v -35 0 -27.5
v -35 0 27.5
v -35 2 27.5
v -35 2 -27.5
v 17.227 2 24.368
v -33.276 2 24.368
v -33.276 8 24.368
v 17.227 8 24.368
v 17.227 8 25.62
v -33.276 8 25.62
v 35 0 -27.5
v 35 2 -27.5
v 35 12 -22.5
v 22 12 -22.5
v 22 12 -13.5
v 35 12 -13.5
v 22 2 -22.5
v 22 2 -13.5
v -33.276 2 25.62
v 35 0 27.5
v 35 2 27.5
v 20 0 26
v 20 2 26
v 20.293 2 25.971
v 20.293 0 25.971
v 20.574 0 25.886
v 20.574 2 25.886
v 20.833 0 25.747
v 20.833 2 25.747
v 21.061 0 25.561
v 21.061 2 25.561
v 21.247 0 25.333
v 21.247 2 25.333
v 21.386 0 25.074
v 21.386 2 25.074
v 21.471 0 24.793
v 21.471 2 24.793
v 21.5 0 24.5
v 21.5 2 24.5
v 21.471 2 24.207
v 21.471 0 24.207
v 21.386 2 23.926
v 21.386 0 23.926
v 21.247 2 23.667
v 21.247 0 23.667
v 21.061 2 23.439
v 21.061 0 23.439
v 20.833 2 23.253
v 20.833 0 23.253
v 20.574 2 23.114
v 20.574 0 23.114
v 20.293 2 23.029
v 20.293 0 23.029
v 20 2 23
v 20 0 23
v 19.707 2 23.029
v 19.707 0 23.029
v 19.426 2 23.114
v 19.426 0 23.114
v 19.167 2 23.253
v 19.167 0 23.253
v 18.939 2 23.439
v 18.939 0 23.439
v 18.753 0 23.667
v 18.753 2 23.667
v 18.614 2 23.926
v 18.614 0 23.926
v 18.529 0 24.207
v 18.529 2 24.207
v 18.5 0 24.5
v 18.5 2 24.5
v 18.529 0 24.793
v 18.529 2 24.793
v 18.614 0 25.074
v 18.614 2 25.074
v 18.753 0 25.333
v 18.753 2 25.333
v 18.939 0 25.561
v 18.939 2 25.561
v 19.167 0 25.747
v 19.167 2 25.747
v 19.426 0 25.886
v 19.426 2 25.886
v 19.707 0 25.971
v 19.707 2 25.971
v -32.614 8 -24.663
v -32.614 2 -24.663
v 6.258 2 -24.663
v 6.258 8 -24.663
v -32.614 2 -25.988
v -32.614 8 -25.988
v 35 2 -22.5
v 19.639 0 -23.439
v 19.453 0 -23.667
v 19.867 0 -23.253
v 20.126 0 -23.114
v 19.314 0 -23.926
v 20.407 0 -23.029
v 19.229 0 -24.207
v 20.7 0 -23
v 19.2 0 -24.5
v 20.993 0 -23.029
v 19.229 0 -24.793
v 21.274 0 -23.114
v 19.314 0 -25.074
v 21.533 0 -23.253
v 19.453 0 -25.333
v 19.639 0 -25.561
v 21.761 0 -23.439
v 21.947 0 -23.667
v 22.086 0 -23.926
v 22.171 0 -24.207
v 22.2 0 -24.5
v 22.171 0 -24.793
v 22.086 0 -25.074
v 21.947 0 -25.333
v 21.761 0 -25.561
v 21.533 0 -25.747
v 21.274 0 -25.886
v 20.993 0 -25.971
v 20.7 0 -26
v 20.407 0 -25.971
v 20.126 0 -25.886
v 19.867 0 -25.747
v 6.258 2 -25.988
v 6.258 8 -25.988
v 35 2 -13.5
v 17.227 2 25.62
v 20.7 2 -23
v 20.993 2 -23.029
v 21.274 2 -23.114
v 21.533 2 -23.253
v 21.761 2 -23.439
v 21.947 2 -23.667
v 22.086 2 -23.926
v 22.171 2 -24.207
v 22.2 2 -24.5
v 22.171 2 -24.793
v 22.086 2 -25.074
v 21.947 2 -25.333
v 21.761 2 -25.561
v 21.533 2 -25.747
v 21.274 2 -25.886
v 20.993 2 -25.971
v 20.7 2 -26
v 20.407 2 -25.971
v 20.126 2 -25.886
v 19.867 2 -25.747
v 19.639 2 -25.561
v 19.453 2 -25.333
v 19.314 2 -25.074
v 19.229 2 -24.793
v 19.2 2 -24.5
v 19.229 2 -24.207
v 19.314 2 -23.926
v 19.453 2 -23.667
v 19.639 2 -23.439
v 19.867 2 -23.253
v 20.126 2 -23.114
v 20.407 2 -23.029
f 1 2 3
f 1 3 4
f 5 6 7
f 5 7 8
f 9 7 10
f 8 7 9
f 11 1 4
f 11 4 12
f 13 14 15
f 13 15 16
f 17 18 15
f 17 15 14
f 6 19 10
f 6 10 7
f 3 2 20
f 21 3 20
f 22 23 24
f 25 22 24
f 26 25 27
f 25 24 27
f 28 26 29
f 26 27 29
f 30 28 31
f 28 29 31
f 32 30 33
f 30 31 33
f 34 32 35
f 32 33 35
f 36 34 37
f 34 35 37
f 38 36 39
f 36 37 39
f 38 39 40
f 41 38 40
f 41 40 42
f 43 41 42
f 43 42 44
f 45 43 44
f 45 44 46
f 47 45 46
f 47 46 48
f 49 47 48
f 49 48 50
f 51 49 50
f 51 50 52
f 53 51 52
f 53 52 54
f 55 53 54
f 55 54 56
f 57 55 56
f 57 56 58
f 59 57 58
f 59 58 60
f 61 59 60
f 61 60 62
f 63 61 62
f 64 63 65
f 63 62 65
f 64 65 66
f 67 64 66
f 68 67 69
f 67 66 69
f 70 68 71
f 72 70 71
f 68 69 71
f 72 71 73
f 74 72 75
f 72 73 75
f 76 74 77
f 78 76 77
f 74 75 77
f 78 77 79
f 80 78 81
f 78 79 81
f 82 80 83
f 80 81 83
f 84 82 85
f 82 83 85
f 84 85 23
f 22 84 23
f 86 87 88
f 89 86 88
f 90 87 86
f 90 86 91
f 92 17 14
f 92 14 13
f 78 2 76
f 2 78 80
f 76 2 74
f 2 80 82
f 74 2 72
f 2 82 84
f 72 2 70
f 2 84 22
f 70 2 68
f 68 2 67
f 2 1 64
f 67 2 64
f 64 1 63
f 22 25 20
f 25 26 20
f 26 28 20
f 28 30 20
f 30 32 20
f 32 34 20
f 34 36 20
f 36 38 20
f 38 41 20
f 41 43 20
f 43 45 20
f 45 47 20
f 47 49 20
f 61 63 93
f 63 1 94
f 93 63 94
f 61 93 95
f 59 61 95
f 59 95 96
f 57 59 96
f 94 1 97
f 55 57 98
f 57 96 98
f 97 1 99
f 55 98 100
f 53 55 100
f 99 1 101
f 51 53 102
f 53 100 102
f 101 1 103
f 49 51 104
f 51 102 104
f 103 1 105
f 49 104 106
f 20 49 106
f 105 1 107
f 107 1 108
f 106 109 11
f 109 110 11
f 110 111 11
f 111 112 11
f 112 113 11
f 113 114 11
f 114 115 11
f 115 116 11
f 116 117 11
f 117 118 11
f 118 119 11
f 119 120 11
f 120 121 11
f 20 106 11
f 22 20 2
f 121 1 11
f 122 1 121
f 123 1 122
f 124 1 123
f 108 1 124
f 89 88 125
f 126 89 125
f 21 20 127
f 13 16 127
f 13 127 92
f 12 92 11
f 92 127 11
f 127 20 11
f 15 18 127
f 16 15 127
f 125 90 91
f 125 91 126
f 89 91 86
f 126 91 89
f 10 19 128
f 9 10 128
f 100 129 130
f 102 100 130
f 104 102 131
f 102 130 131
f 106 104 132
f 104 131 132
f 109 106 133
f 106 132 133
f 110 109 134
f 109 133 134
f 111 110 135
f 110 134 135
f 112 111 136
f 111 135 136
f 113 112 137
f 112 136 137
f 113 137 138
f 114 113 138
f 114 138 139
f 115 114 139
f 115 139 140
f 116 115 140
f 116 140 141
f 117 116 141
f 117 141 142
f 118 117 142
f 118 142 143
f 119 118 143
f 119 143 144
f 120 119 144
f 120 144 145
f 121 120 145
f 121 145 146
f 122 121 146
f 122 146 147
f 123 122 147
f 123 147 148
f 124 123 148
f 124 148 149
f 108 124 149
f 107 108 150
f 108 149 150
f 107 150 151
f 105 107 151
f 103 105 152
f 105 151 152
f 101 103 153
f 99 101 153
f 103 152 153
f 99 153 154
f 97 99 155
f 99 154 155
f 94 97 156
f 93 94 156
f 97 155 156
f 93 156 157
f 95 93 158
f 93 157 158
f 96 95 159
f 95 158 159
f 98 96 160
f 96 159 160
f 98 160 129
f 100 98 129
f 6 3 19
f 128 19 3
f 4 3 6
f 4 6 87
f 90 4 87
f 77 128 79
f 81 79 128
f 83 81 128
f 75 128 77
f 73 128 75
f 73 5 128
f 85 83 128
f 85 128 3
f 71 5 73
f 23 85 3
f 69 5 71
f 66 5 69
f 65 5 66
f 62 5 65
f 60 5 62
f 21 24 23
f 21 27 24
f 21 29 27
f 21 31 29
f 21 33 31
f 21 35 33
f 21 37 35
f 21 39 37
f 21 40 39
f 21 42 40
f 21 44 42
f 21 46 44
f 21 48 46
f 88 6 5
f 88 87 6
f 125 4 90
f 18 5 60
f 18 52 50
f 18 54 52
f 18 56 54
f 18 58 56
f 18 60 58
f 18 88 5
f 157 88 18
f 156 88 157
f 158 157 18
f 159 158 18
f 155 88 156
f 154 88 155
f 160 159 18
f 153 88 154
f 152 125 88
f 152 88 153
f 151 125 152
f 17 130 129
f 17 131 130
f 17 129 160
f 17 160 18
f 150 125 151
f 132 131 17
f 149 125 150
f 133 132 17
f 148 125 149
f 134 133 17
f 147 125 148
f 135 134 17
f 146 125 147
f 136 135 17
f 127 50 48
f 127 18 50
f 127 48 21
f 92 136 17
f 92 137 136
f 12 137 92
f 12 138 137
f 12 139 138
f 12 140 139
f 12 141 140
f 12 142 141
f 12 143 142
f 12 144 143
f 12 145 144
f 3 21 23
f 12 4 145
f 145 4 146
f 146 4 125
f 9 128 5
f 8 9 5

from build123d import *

# Parameters (mm, degrees)
ESQUISSE2_W             = 70
ESQUISSE2_H             = 55
BOSS_EXTRU_1_DEPTH      = 2
ESQUISSE3_W             = 13
ESQUISSE3_H             = 9
BOSS_EXTRU_2_DEPTH      = 10
ESQUISSE4_W             = 38.871257781
ESQUISSE4_H             = 1.325156515
ESQUISSE4_W_2           = 50.503187194
ESQUISSE4_H_2           = 1.251536709
BOSS_EXTRU_3_DEPTH      = 6
ESQUISSE5_R             = 1.5
ENL_V_MAT_EXTRU_1_DEPTH = 6
ESQUISSE6_R             = 1.5
ENL_V_MAT_EXTRU_2_DEPTH = 6


with BuildPart() as part:
    # Esquisse2 → Boss.-Extru.1 (new body)
    with BuildSketch(Plane(origin=(0, 0, 0), x_dir=(1, 0, 0), z_dir=(0, 1, 0))):
        Rectangle(ESQUISSE2_W, ESQUISSE2_H)
    extrude(amount=BOSS_EXTRU_1_DEPTH)

    # Esquisse3 → Boss.-Extru.2 (add)
    with BuildSketch(Plane(origin=(0, 2, 0), x_dir=(1, 0, 0), z_dir=(0, 1, 0))):
        with Locations((28.5, 18)):
            Rectangle(ESQUISSE3_W, ESQUISSE3_H)
    extrude(amount=BOSS_EXTRU_2_DEPTH)

    # Esquisse4 → Boss.-Extru.3 (add)
    with BuildSketch(Plane(origin=(0, 2, 0), x_dir=(1, 0, 0), z_dir=(0, 1, 0))):
        with Locations((-13.177945346, 25.325213404)):
            Rectangle(ESQUISSE4_W, ESQUISSE4_H)
        with Locations((-8.024558898, -24.993924275)):
            Rectangle(ESQUISSE4_W_2, ESQUISSE4_H_2)
    extrude(amount=BOSS_EXTRU_3_DEPTH)

    # Esquisse5 → Enlèv. mat.-Extru.1 (cut)
    with BuildSketch(Plane(origin=(0, 2, 0), x_dir=(1, 0, 0), z_dir=(0, 1, 0))):
        with Locations(Location((20, -24.5, 0), (0, 0, 270))):
            Circle(ESQUISSE5_R)
    extrude(amount=-ENL_V_MAT_EXTRU_1_DEPTH, mode=Mode.SUBTRACT)

    # Esquisse6 → Enlèv. mat.-Extru.2 (cut)
    with BuildSketch(Plane(origin=(0, 2, 0), x_dir=(1, 0, 0), z_dir=(0, 1, 0))):
        with Locations(Location((20.7, 24.5, 0), (0, 0, 270))):
            Circle(ESQUISSE6_R)
    extrude(amount=-ENL_V_MAT_EXTRU_2_DEPTH, mode=Mode.SUBTRACT)


solid = part.part
